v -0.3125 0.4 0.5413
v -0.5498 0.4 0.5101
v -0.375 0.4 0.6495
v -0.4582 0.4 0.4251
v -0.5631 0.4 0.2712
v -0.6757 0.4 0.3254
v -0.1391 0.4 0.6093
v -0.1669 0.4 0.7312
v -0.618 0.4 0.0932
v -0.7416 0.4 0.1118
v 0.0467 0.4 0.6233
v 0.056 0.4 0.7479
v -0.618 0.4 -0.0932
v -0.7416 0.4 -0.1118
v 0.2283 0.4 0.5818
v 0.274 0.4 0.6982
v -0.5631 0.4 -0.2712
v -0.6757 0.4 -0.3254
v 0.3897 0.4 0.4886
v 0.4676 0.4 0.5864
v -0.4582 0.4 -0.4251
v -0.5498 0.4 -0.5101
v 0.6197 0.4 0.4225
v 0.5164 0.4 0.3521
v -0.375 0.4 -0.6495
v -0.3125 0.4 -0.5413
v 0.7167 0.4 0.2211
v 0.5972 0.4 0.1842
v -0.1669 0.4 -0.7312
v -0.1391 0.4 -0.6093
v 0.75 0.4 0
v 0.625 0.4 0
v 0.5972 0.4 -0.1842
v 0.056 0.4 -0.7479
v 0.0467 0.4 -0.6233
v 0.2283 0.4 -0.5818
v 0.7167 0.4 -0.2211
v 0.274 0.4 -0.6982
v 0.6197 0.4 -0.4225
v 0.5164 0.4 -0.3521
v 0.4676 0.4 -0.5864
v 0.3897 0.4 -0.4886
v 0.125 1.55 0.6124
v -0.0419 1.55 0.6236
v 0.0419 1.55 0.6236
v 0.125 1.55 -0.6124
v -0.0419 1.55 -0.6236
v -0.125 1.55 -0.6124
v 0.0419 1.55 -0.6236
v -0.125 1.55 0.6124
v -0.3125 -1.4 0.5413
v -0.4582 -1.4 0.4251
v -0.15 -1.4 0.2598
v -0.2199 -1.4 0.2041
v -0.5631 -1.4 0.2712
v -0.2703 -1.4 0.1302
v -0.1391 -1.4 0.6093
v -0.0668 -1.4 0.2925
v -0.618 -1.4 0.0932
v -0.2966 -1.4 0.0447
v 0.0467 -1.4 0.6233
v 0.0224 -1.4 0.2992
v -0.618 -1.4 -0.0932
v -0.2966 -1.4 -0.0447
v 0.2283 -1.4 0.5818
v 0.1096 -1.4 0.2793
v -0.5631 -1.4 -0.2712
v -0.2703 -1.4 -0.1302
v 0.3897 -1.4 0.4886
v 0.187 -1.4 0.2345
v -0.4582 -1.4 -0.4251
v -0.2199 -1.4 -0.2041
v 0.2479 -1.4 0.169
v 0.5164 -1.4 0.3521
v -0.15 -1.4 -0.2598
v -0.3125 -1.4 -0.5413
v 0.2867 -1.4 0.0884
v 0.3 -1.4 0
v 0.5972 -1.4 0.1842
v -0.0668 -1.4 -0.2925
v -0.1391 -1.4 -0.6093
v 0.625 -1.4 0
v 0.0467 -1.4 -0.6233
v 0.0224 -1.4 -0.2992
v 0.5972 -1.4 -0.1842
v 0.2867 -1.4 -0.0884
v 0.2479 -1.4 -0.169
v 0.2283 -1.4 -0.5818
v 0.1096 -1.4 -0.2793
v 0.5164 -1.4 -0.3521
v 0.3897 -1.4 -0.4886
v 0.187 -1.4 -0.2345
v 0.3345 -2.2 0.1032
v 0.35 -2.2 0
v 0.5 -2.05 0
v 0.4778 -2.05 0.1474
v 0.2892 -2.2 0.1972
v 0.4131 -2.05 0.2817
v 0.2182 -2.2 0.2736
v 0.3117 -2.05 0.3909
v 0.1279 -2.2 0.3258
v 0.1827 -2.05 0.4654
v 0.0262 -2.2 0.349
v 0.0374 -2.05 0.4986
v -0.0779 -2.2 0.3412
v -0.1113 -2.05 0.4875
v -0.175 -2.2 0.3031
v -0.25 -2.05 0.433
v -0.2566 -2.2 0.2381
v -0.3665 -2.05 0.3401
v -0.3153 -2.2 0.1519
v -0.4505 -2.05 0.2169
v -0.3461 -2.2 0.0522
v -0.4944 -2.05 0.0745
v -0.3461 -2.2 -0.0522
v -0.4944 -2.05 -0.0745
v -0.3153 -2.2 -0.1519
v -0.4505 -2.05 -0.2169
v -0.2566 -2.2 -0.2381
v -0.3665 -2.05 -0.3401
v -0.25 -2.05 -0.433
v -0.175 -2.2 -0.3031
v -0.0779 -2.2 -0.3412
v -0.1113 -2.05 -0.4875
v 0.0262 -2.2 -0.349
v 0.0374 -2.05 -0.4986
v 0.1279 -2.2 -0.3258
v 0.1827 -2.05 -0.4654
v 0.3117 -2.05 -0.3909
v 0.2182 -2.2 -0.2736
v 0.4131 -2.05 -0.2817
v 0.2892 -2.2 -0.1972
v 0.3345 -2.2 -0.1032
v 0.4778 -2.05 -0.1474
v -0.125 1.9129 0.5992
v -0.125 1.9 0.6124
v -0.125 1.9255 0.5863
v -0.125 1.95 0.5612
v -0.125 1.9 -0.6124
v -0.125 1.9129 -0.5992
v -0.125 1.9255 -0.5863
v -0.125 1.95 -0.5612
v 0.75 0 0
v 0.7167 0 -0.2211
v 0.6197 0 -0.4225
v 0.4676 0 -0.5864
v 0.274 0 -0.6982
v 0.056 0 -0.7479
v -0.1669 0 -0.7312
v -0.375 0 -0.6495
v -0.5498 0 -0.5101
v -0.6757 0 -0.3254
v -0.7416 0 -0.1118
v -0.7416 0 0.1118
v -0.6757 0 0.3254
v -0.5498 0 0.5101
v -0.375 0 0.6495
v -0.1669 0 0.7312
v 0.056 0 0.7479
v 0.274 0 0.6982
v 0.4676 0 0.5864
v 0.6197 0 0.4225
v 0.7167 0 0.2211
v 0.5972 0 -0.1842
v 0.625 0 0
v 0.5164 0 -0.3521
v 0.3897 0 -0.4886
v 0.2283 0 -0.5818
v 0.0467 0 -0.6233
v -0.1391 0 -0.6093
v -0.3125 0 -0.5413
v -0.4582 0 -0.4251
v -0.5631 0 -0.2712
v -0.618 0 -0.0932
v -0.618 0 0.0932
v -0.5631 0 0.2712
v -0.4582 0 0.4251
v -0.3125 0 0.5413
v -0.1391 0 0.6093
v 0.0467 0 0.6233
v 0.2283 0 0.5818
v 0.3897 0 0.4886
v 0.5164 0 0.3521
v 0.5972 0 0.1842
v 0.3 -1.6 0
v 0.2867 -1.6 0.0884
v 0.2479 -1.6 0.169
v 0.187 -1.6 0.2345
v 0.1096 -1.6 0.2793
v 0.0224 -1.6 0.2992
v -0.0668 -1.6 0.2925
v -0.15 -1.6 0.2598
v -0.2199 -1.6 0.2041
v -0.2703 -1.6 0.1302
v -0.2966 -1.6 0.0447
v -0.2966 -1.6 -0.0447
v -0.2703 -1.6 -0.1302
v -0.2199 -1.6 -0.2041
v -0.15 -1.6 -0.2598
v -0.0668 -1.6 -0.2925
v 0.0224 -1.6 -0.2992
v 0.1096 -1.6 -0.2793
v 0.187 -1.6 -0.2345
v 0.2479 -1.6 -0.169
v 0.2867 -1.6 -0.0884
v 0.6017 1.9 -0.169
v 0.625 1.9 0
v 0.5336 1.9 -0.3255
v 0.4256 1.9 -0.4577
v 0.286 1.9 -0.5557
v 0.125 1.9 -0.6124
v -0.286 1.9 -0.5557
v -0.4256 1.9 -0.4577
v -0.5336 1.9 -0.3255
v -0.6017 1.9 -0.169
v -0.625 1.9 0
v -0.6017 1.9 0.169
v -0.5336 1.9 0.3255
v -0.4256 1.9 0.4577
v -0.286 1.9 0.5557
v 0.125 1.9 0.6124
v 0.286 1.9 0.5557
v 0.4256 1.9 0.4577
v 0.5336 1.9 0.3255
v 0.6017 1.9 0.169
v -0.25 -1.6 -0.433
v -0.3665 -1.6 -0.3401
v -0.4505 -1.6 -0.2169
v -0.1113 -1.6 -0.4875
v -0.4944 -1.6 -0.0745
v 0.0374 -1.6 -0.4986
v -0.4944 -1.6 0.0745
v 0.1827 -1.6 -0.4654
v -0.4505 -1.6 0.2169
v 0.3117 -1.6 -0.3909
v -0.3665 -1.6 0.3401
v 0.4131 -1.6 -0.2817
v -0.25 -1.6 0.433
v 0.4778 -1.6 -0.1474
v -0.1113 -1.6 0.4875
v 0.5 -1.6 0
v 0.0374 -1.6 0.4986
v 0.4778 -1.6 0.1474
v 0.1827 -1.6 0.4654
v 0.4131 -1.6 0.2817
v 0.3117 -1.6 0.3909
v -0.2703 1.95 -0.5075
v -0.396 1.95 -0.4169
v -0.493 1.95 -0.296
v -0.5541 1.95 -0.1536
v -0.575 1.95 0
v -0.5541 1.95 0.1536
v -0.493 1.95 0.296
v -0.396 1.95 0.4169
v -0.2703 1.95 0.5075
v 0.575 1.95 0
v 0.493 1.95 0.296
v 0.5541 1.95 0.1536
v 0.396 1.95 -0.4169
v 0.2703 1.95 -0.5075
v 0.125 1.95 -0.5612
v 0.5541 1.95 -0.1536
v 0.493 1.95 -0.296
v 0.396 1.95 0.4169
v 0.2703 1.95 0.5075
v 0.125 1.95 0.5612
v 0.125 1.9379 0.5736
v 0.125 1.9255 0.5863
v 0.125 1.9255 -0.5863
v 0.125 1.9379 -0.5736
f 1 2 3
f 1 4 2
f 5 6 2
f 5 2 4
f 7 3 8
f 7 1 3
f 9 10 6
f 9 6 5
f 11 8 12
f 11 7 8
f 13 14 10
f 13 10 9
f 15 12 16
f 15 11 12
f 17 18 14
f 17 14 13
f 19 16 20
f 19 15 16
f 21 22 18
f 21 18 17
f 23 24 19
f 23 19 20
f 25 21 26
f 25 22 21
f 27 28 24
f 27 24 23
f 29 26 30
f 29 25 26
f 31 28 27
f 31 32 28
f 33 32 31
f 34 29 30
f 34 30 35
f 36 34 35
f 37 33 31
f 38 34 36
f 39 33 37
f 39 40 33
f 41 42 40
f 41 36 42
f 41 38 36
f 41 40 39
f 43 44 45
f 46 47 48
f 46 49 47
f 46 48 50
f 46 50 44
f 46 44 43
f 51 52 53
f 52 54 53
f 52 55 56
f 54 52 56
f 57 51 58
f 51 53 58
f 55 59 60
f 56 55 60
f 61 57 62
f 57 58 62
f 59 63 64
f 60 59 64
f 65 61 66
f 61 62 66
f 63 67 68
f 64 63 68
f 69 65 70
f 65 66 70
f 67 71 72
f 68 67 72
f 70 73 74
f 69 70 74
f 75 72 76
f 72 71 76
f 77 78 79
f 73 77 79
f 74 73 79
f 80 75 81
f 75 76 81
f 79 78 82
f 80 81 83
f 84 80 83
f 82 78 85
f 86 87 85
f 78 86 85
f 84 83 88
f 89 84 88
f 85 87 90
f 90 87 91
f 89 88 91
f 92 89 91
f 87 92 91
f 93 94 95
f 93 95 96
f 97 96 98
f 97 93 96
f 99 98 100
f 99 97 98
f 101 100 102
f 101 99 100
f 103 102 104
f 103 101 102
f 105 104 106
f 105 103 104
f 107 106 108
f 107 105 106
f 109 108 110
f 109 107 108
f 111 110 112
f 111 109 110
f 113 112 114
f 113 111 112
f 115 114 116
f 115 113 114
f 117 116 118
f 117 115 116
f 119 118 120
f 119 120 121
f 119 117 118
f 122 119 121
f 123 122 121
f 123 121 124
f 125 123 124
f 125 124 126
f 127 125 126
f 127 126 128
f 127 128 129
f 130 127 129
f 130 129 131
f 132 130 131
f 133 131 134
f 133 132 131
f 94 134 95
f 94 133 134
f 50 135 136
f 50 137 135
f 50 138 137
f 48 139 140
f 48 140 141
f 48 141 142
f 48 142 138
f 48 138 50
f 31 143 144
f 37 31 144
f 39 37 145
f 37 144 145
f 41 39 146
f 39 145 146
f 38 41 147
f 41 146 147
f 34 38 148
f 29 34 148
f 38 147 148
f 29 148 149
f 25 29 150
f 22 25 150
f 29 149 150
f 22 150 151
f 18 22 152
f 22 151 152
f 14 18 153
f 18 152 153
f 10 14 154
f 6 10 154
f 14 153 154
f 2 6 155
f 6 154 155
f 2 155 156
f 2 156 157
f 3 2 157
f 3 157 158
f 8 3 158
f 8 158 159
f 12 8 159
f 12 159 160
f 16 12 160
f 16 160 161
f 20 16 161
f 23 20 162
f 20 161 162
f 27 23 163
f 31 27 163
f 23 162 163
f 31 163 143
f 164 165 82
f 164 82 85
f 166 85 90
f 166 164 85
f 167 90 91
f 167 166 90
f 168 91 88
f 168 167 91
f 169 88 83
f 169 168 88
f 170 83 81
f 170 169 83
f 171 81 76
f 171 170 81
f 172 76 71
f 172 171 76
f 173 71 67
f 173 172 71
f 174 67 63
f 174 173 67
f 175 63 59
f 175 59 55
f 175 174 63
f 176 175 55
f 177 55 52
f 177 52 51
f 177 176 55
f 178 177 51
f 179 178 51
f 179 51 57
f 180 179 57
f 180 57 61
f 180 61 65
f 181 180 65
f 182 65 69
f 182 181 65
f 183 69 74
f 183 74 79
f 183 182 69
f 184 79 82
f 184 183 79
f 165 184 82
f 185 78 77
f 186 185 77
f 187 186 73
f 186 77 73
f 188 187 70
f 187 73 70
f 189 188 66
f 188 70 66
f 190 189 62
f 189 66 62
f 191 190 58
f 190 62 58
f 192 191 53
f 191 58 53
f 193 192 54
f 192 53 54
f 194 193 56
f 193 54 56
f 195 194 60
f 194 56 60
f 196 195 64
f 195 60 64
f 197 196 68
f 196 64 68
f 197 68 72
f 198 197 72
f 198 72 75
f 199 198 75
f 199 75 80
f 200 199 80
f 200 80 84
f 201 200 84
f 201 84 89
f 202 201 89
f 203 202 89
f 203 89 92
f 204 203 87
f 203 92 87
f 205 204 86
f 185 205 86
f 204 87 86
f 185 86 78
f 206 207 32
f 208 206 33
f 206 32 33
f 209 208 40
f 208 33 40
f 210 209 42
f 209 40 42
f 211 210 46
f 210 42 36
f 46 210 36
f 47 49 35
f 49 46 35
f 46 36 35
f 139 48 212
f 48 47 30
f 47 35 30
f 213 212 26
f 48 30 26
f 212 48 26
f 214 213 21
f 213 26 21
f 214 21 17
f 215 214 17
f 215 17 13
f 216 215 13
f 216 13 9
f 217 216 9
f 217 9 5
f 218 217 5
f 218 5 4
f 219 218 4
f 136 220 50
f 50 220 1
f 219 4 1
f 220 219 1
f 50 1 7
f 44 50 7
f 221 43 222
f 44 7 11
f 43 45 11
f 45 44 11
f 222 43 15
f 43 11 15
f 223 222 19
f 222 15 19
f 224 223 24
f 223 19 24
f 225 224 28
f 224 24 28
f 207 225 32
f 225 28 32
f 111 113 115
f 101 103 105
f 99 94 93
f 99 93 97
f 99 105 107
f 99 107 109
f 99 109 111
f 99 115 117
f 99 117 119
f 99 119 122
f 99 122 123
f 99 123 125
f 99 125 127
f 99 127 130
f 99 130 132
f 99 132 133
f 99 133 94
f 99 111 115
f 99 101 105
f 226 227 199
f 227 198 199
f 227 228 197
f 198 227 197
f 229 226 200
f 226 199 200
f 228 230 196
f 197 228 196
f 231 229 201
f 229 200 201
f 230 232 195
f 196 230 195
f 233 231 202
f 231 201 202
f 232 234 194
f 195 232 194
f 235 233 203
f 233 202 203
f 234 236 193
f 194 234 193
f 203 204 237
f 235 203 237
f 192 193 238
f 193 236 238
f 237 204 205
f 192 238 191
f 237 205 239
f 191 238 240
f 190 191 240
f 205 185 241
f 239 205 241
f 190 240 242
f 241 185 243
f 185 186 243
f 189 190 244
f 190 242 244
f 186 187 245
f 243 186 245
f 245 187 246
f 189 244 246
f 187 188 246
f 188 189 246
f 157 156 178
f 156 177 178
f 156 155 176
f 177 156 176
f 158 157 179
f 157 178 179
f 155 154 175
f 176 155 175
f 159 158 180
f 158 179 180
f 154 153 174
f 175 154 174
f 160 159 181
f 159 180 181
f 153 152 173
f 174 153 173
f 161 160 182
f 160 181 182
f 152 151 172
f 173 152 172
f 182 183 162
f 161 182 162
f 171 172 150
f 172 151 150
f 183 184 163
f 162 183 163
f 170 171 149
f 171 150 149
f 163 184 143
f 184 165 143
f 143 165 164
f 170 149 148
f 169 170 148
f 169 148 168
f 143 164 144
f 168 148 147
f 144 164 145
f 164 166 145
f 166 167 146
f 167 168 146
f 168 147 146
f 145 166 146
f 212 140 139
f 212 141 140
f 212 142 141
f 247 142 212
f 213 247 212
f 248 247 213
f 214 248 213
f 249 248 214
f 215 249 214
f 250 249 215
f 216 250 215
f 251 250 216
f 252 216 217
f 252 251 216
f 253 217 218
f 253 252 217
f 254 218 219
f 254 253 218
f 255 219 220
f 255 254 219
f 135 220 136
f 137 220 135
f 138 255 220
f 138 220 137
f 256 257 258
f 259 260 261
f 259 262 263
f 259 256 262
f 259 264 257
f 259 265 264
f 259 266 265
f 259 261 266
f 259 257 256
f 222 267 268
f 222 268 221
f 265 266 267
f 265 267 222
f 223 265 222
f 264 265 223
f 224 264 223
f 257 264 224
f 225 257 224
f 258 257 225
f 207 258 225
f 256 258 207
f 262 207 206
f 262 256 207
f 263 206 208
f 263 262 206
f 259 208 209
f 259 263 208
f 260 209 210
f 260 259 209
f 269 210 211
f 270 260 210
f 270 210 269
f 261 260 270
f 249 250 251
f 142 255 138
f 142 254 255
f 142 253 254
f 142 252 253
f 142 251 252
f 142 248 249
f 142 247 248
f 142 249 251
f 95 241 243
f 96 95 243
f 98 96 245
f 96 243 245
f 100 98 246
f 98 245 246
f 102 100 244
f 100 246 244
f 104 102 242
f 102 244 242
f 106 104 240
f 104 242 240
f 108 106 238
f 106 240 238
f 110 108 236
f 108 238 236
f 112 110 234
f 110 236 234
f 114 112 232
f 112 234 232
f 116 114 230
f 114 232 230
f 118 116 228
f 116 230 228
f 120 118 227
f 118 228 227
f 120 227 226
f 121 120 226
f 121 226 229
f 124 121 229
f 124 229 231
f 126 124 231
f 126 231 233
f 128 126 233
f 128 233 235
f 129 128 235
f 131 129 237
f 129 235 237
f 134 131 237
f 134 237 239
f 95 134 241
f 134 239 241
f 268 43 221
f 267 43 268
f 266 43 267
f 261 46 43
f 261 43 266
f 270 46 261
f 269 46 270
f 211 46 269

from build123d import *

# Parameters (mm, degrees)
SKETCH1_R               = 0.75
BOSS_EXTRUDE1_DEPTH     = 0.4
SKETCH2_R               = 0.625
BOSS_EXTRUDE2_DEPTH     = 1.55
SKETCH3_R               = 0.625
BOSS_EXTRUDE3_DEPTH     = 1.4
SKETCH4_R               = 0.3
BOSS_EXTRUDE4_DEPTH     = 0.2
SKETCH5_R               = 0.5
BOSS_EXTRUDE5_DEPTH     = 0.6
CHAMFER1_SIZE           = 0.05
CHAMFER2_SIZE           = 0.15
CUT_EXTRUDE1_DEPTH      = 1.75
CUT_EXTRUDE1_DEPTH_BACK = 1.75


with BuildPart() as part:
    # Sketch1 → Boss-Extrude1 (new body)
    with BuildSketch(Plane(origin=(0, 0, 0), x_dir=(1, 0, 0), z_dir=(0, 1, 0))):
        Circle(SKETCH1_R)
    extrude(amount=BOSS_EXTRUDE1_DEPTH)

    # Sketch2 → Boss-Extrude2 (add)
    with BuildSketch(Plane(origin=(0, 0.4, 0), x_dir=(1, 0, 0), z_dir=(0, 1, 0))):
        Circle(SKETCH2_R)
    extrude(amount=BOSS_EXTRUDE2_DEPTH)

    # Sketch3 → Boss-Extrude3 (add)
    with BuildSketch(Plane(origin=(0, 0, 0), x_dir=(1, 0, 0), z_dir=(0, 1, 0))):
        Circle(SKETCH3_R)
    extrude(amount=-BOSS_EXTRUDE3_DEPTH)

    # Sketch4 → Boss-Extrude4 (add)
    with BuildSketch(Plane.XZ.offset(1.4)):
        Circle(SKETCH4_R)
    extrude(amount=BOSS_EXTRUDE4_DEPTH)

    # Sketch5 → Boss-Extrude5 (add)
    with BuildSketch(Plane.XZ.offset(1.6)):
        Circle(SKETCH5_R)
    extrude(amount=BOSS_EXTRUDE5_DEPTH)

    # Chamfer1
    chamfer1_edges = [part.edges().sort_by_distance(p)[0] for p in [
        (-0.625, 1.95, 0),
    ]]
    chamfer(chamfer1_edges, length=CHAMFER1_SIZE)

    # Chamfer2
    chamfer2_edges = [part.edges().sort_by_distance(p)[0] for p in [
        (-0.5, -2.2, 0),
    ]]
    chamfer(chamfer2_edges, length=CHAMFER2_SIZE)

    # Sketch6 → Cut-Extrude1 (cut, two sides)
    with BuildSketch(Plane.XY) as cut_extrude1_sk:
        Polygon((0.125, 2.131643459), (-0.125, 2.131643459), (-0.125, 1.55), (0, 1.55), (0.125, 1.55), align=None)
    extrude(amount=CUT_EXTRUDE1_DEPTH, mode=Mode.SUBTRACT)
    extrude(cut_extrude1_sk.sketch, amount=-CUT_EXTRUDE1_DEPTH_BACK, mode=Mode.SUBTRACT)


solid = part.part
